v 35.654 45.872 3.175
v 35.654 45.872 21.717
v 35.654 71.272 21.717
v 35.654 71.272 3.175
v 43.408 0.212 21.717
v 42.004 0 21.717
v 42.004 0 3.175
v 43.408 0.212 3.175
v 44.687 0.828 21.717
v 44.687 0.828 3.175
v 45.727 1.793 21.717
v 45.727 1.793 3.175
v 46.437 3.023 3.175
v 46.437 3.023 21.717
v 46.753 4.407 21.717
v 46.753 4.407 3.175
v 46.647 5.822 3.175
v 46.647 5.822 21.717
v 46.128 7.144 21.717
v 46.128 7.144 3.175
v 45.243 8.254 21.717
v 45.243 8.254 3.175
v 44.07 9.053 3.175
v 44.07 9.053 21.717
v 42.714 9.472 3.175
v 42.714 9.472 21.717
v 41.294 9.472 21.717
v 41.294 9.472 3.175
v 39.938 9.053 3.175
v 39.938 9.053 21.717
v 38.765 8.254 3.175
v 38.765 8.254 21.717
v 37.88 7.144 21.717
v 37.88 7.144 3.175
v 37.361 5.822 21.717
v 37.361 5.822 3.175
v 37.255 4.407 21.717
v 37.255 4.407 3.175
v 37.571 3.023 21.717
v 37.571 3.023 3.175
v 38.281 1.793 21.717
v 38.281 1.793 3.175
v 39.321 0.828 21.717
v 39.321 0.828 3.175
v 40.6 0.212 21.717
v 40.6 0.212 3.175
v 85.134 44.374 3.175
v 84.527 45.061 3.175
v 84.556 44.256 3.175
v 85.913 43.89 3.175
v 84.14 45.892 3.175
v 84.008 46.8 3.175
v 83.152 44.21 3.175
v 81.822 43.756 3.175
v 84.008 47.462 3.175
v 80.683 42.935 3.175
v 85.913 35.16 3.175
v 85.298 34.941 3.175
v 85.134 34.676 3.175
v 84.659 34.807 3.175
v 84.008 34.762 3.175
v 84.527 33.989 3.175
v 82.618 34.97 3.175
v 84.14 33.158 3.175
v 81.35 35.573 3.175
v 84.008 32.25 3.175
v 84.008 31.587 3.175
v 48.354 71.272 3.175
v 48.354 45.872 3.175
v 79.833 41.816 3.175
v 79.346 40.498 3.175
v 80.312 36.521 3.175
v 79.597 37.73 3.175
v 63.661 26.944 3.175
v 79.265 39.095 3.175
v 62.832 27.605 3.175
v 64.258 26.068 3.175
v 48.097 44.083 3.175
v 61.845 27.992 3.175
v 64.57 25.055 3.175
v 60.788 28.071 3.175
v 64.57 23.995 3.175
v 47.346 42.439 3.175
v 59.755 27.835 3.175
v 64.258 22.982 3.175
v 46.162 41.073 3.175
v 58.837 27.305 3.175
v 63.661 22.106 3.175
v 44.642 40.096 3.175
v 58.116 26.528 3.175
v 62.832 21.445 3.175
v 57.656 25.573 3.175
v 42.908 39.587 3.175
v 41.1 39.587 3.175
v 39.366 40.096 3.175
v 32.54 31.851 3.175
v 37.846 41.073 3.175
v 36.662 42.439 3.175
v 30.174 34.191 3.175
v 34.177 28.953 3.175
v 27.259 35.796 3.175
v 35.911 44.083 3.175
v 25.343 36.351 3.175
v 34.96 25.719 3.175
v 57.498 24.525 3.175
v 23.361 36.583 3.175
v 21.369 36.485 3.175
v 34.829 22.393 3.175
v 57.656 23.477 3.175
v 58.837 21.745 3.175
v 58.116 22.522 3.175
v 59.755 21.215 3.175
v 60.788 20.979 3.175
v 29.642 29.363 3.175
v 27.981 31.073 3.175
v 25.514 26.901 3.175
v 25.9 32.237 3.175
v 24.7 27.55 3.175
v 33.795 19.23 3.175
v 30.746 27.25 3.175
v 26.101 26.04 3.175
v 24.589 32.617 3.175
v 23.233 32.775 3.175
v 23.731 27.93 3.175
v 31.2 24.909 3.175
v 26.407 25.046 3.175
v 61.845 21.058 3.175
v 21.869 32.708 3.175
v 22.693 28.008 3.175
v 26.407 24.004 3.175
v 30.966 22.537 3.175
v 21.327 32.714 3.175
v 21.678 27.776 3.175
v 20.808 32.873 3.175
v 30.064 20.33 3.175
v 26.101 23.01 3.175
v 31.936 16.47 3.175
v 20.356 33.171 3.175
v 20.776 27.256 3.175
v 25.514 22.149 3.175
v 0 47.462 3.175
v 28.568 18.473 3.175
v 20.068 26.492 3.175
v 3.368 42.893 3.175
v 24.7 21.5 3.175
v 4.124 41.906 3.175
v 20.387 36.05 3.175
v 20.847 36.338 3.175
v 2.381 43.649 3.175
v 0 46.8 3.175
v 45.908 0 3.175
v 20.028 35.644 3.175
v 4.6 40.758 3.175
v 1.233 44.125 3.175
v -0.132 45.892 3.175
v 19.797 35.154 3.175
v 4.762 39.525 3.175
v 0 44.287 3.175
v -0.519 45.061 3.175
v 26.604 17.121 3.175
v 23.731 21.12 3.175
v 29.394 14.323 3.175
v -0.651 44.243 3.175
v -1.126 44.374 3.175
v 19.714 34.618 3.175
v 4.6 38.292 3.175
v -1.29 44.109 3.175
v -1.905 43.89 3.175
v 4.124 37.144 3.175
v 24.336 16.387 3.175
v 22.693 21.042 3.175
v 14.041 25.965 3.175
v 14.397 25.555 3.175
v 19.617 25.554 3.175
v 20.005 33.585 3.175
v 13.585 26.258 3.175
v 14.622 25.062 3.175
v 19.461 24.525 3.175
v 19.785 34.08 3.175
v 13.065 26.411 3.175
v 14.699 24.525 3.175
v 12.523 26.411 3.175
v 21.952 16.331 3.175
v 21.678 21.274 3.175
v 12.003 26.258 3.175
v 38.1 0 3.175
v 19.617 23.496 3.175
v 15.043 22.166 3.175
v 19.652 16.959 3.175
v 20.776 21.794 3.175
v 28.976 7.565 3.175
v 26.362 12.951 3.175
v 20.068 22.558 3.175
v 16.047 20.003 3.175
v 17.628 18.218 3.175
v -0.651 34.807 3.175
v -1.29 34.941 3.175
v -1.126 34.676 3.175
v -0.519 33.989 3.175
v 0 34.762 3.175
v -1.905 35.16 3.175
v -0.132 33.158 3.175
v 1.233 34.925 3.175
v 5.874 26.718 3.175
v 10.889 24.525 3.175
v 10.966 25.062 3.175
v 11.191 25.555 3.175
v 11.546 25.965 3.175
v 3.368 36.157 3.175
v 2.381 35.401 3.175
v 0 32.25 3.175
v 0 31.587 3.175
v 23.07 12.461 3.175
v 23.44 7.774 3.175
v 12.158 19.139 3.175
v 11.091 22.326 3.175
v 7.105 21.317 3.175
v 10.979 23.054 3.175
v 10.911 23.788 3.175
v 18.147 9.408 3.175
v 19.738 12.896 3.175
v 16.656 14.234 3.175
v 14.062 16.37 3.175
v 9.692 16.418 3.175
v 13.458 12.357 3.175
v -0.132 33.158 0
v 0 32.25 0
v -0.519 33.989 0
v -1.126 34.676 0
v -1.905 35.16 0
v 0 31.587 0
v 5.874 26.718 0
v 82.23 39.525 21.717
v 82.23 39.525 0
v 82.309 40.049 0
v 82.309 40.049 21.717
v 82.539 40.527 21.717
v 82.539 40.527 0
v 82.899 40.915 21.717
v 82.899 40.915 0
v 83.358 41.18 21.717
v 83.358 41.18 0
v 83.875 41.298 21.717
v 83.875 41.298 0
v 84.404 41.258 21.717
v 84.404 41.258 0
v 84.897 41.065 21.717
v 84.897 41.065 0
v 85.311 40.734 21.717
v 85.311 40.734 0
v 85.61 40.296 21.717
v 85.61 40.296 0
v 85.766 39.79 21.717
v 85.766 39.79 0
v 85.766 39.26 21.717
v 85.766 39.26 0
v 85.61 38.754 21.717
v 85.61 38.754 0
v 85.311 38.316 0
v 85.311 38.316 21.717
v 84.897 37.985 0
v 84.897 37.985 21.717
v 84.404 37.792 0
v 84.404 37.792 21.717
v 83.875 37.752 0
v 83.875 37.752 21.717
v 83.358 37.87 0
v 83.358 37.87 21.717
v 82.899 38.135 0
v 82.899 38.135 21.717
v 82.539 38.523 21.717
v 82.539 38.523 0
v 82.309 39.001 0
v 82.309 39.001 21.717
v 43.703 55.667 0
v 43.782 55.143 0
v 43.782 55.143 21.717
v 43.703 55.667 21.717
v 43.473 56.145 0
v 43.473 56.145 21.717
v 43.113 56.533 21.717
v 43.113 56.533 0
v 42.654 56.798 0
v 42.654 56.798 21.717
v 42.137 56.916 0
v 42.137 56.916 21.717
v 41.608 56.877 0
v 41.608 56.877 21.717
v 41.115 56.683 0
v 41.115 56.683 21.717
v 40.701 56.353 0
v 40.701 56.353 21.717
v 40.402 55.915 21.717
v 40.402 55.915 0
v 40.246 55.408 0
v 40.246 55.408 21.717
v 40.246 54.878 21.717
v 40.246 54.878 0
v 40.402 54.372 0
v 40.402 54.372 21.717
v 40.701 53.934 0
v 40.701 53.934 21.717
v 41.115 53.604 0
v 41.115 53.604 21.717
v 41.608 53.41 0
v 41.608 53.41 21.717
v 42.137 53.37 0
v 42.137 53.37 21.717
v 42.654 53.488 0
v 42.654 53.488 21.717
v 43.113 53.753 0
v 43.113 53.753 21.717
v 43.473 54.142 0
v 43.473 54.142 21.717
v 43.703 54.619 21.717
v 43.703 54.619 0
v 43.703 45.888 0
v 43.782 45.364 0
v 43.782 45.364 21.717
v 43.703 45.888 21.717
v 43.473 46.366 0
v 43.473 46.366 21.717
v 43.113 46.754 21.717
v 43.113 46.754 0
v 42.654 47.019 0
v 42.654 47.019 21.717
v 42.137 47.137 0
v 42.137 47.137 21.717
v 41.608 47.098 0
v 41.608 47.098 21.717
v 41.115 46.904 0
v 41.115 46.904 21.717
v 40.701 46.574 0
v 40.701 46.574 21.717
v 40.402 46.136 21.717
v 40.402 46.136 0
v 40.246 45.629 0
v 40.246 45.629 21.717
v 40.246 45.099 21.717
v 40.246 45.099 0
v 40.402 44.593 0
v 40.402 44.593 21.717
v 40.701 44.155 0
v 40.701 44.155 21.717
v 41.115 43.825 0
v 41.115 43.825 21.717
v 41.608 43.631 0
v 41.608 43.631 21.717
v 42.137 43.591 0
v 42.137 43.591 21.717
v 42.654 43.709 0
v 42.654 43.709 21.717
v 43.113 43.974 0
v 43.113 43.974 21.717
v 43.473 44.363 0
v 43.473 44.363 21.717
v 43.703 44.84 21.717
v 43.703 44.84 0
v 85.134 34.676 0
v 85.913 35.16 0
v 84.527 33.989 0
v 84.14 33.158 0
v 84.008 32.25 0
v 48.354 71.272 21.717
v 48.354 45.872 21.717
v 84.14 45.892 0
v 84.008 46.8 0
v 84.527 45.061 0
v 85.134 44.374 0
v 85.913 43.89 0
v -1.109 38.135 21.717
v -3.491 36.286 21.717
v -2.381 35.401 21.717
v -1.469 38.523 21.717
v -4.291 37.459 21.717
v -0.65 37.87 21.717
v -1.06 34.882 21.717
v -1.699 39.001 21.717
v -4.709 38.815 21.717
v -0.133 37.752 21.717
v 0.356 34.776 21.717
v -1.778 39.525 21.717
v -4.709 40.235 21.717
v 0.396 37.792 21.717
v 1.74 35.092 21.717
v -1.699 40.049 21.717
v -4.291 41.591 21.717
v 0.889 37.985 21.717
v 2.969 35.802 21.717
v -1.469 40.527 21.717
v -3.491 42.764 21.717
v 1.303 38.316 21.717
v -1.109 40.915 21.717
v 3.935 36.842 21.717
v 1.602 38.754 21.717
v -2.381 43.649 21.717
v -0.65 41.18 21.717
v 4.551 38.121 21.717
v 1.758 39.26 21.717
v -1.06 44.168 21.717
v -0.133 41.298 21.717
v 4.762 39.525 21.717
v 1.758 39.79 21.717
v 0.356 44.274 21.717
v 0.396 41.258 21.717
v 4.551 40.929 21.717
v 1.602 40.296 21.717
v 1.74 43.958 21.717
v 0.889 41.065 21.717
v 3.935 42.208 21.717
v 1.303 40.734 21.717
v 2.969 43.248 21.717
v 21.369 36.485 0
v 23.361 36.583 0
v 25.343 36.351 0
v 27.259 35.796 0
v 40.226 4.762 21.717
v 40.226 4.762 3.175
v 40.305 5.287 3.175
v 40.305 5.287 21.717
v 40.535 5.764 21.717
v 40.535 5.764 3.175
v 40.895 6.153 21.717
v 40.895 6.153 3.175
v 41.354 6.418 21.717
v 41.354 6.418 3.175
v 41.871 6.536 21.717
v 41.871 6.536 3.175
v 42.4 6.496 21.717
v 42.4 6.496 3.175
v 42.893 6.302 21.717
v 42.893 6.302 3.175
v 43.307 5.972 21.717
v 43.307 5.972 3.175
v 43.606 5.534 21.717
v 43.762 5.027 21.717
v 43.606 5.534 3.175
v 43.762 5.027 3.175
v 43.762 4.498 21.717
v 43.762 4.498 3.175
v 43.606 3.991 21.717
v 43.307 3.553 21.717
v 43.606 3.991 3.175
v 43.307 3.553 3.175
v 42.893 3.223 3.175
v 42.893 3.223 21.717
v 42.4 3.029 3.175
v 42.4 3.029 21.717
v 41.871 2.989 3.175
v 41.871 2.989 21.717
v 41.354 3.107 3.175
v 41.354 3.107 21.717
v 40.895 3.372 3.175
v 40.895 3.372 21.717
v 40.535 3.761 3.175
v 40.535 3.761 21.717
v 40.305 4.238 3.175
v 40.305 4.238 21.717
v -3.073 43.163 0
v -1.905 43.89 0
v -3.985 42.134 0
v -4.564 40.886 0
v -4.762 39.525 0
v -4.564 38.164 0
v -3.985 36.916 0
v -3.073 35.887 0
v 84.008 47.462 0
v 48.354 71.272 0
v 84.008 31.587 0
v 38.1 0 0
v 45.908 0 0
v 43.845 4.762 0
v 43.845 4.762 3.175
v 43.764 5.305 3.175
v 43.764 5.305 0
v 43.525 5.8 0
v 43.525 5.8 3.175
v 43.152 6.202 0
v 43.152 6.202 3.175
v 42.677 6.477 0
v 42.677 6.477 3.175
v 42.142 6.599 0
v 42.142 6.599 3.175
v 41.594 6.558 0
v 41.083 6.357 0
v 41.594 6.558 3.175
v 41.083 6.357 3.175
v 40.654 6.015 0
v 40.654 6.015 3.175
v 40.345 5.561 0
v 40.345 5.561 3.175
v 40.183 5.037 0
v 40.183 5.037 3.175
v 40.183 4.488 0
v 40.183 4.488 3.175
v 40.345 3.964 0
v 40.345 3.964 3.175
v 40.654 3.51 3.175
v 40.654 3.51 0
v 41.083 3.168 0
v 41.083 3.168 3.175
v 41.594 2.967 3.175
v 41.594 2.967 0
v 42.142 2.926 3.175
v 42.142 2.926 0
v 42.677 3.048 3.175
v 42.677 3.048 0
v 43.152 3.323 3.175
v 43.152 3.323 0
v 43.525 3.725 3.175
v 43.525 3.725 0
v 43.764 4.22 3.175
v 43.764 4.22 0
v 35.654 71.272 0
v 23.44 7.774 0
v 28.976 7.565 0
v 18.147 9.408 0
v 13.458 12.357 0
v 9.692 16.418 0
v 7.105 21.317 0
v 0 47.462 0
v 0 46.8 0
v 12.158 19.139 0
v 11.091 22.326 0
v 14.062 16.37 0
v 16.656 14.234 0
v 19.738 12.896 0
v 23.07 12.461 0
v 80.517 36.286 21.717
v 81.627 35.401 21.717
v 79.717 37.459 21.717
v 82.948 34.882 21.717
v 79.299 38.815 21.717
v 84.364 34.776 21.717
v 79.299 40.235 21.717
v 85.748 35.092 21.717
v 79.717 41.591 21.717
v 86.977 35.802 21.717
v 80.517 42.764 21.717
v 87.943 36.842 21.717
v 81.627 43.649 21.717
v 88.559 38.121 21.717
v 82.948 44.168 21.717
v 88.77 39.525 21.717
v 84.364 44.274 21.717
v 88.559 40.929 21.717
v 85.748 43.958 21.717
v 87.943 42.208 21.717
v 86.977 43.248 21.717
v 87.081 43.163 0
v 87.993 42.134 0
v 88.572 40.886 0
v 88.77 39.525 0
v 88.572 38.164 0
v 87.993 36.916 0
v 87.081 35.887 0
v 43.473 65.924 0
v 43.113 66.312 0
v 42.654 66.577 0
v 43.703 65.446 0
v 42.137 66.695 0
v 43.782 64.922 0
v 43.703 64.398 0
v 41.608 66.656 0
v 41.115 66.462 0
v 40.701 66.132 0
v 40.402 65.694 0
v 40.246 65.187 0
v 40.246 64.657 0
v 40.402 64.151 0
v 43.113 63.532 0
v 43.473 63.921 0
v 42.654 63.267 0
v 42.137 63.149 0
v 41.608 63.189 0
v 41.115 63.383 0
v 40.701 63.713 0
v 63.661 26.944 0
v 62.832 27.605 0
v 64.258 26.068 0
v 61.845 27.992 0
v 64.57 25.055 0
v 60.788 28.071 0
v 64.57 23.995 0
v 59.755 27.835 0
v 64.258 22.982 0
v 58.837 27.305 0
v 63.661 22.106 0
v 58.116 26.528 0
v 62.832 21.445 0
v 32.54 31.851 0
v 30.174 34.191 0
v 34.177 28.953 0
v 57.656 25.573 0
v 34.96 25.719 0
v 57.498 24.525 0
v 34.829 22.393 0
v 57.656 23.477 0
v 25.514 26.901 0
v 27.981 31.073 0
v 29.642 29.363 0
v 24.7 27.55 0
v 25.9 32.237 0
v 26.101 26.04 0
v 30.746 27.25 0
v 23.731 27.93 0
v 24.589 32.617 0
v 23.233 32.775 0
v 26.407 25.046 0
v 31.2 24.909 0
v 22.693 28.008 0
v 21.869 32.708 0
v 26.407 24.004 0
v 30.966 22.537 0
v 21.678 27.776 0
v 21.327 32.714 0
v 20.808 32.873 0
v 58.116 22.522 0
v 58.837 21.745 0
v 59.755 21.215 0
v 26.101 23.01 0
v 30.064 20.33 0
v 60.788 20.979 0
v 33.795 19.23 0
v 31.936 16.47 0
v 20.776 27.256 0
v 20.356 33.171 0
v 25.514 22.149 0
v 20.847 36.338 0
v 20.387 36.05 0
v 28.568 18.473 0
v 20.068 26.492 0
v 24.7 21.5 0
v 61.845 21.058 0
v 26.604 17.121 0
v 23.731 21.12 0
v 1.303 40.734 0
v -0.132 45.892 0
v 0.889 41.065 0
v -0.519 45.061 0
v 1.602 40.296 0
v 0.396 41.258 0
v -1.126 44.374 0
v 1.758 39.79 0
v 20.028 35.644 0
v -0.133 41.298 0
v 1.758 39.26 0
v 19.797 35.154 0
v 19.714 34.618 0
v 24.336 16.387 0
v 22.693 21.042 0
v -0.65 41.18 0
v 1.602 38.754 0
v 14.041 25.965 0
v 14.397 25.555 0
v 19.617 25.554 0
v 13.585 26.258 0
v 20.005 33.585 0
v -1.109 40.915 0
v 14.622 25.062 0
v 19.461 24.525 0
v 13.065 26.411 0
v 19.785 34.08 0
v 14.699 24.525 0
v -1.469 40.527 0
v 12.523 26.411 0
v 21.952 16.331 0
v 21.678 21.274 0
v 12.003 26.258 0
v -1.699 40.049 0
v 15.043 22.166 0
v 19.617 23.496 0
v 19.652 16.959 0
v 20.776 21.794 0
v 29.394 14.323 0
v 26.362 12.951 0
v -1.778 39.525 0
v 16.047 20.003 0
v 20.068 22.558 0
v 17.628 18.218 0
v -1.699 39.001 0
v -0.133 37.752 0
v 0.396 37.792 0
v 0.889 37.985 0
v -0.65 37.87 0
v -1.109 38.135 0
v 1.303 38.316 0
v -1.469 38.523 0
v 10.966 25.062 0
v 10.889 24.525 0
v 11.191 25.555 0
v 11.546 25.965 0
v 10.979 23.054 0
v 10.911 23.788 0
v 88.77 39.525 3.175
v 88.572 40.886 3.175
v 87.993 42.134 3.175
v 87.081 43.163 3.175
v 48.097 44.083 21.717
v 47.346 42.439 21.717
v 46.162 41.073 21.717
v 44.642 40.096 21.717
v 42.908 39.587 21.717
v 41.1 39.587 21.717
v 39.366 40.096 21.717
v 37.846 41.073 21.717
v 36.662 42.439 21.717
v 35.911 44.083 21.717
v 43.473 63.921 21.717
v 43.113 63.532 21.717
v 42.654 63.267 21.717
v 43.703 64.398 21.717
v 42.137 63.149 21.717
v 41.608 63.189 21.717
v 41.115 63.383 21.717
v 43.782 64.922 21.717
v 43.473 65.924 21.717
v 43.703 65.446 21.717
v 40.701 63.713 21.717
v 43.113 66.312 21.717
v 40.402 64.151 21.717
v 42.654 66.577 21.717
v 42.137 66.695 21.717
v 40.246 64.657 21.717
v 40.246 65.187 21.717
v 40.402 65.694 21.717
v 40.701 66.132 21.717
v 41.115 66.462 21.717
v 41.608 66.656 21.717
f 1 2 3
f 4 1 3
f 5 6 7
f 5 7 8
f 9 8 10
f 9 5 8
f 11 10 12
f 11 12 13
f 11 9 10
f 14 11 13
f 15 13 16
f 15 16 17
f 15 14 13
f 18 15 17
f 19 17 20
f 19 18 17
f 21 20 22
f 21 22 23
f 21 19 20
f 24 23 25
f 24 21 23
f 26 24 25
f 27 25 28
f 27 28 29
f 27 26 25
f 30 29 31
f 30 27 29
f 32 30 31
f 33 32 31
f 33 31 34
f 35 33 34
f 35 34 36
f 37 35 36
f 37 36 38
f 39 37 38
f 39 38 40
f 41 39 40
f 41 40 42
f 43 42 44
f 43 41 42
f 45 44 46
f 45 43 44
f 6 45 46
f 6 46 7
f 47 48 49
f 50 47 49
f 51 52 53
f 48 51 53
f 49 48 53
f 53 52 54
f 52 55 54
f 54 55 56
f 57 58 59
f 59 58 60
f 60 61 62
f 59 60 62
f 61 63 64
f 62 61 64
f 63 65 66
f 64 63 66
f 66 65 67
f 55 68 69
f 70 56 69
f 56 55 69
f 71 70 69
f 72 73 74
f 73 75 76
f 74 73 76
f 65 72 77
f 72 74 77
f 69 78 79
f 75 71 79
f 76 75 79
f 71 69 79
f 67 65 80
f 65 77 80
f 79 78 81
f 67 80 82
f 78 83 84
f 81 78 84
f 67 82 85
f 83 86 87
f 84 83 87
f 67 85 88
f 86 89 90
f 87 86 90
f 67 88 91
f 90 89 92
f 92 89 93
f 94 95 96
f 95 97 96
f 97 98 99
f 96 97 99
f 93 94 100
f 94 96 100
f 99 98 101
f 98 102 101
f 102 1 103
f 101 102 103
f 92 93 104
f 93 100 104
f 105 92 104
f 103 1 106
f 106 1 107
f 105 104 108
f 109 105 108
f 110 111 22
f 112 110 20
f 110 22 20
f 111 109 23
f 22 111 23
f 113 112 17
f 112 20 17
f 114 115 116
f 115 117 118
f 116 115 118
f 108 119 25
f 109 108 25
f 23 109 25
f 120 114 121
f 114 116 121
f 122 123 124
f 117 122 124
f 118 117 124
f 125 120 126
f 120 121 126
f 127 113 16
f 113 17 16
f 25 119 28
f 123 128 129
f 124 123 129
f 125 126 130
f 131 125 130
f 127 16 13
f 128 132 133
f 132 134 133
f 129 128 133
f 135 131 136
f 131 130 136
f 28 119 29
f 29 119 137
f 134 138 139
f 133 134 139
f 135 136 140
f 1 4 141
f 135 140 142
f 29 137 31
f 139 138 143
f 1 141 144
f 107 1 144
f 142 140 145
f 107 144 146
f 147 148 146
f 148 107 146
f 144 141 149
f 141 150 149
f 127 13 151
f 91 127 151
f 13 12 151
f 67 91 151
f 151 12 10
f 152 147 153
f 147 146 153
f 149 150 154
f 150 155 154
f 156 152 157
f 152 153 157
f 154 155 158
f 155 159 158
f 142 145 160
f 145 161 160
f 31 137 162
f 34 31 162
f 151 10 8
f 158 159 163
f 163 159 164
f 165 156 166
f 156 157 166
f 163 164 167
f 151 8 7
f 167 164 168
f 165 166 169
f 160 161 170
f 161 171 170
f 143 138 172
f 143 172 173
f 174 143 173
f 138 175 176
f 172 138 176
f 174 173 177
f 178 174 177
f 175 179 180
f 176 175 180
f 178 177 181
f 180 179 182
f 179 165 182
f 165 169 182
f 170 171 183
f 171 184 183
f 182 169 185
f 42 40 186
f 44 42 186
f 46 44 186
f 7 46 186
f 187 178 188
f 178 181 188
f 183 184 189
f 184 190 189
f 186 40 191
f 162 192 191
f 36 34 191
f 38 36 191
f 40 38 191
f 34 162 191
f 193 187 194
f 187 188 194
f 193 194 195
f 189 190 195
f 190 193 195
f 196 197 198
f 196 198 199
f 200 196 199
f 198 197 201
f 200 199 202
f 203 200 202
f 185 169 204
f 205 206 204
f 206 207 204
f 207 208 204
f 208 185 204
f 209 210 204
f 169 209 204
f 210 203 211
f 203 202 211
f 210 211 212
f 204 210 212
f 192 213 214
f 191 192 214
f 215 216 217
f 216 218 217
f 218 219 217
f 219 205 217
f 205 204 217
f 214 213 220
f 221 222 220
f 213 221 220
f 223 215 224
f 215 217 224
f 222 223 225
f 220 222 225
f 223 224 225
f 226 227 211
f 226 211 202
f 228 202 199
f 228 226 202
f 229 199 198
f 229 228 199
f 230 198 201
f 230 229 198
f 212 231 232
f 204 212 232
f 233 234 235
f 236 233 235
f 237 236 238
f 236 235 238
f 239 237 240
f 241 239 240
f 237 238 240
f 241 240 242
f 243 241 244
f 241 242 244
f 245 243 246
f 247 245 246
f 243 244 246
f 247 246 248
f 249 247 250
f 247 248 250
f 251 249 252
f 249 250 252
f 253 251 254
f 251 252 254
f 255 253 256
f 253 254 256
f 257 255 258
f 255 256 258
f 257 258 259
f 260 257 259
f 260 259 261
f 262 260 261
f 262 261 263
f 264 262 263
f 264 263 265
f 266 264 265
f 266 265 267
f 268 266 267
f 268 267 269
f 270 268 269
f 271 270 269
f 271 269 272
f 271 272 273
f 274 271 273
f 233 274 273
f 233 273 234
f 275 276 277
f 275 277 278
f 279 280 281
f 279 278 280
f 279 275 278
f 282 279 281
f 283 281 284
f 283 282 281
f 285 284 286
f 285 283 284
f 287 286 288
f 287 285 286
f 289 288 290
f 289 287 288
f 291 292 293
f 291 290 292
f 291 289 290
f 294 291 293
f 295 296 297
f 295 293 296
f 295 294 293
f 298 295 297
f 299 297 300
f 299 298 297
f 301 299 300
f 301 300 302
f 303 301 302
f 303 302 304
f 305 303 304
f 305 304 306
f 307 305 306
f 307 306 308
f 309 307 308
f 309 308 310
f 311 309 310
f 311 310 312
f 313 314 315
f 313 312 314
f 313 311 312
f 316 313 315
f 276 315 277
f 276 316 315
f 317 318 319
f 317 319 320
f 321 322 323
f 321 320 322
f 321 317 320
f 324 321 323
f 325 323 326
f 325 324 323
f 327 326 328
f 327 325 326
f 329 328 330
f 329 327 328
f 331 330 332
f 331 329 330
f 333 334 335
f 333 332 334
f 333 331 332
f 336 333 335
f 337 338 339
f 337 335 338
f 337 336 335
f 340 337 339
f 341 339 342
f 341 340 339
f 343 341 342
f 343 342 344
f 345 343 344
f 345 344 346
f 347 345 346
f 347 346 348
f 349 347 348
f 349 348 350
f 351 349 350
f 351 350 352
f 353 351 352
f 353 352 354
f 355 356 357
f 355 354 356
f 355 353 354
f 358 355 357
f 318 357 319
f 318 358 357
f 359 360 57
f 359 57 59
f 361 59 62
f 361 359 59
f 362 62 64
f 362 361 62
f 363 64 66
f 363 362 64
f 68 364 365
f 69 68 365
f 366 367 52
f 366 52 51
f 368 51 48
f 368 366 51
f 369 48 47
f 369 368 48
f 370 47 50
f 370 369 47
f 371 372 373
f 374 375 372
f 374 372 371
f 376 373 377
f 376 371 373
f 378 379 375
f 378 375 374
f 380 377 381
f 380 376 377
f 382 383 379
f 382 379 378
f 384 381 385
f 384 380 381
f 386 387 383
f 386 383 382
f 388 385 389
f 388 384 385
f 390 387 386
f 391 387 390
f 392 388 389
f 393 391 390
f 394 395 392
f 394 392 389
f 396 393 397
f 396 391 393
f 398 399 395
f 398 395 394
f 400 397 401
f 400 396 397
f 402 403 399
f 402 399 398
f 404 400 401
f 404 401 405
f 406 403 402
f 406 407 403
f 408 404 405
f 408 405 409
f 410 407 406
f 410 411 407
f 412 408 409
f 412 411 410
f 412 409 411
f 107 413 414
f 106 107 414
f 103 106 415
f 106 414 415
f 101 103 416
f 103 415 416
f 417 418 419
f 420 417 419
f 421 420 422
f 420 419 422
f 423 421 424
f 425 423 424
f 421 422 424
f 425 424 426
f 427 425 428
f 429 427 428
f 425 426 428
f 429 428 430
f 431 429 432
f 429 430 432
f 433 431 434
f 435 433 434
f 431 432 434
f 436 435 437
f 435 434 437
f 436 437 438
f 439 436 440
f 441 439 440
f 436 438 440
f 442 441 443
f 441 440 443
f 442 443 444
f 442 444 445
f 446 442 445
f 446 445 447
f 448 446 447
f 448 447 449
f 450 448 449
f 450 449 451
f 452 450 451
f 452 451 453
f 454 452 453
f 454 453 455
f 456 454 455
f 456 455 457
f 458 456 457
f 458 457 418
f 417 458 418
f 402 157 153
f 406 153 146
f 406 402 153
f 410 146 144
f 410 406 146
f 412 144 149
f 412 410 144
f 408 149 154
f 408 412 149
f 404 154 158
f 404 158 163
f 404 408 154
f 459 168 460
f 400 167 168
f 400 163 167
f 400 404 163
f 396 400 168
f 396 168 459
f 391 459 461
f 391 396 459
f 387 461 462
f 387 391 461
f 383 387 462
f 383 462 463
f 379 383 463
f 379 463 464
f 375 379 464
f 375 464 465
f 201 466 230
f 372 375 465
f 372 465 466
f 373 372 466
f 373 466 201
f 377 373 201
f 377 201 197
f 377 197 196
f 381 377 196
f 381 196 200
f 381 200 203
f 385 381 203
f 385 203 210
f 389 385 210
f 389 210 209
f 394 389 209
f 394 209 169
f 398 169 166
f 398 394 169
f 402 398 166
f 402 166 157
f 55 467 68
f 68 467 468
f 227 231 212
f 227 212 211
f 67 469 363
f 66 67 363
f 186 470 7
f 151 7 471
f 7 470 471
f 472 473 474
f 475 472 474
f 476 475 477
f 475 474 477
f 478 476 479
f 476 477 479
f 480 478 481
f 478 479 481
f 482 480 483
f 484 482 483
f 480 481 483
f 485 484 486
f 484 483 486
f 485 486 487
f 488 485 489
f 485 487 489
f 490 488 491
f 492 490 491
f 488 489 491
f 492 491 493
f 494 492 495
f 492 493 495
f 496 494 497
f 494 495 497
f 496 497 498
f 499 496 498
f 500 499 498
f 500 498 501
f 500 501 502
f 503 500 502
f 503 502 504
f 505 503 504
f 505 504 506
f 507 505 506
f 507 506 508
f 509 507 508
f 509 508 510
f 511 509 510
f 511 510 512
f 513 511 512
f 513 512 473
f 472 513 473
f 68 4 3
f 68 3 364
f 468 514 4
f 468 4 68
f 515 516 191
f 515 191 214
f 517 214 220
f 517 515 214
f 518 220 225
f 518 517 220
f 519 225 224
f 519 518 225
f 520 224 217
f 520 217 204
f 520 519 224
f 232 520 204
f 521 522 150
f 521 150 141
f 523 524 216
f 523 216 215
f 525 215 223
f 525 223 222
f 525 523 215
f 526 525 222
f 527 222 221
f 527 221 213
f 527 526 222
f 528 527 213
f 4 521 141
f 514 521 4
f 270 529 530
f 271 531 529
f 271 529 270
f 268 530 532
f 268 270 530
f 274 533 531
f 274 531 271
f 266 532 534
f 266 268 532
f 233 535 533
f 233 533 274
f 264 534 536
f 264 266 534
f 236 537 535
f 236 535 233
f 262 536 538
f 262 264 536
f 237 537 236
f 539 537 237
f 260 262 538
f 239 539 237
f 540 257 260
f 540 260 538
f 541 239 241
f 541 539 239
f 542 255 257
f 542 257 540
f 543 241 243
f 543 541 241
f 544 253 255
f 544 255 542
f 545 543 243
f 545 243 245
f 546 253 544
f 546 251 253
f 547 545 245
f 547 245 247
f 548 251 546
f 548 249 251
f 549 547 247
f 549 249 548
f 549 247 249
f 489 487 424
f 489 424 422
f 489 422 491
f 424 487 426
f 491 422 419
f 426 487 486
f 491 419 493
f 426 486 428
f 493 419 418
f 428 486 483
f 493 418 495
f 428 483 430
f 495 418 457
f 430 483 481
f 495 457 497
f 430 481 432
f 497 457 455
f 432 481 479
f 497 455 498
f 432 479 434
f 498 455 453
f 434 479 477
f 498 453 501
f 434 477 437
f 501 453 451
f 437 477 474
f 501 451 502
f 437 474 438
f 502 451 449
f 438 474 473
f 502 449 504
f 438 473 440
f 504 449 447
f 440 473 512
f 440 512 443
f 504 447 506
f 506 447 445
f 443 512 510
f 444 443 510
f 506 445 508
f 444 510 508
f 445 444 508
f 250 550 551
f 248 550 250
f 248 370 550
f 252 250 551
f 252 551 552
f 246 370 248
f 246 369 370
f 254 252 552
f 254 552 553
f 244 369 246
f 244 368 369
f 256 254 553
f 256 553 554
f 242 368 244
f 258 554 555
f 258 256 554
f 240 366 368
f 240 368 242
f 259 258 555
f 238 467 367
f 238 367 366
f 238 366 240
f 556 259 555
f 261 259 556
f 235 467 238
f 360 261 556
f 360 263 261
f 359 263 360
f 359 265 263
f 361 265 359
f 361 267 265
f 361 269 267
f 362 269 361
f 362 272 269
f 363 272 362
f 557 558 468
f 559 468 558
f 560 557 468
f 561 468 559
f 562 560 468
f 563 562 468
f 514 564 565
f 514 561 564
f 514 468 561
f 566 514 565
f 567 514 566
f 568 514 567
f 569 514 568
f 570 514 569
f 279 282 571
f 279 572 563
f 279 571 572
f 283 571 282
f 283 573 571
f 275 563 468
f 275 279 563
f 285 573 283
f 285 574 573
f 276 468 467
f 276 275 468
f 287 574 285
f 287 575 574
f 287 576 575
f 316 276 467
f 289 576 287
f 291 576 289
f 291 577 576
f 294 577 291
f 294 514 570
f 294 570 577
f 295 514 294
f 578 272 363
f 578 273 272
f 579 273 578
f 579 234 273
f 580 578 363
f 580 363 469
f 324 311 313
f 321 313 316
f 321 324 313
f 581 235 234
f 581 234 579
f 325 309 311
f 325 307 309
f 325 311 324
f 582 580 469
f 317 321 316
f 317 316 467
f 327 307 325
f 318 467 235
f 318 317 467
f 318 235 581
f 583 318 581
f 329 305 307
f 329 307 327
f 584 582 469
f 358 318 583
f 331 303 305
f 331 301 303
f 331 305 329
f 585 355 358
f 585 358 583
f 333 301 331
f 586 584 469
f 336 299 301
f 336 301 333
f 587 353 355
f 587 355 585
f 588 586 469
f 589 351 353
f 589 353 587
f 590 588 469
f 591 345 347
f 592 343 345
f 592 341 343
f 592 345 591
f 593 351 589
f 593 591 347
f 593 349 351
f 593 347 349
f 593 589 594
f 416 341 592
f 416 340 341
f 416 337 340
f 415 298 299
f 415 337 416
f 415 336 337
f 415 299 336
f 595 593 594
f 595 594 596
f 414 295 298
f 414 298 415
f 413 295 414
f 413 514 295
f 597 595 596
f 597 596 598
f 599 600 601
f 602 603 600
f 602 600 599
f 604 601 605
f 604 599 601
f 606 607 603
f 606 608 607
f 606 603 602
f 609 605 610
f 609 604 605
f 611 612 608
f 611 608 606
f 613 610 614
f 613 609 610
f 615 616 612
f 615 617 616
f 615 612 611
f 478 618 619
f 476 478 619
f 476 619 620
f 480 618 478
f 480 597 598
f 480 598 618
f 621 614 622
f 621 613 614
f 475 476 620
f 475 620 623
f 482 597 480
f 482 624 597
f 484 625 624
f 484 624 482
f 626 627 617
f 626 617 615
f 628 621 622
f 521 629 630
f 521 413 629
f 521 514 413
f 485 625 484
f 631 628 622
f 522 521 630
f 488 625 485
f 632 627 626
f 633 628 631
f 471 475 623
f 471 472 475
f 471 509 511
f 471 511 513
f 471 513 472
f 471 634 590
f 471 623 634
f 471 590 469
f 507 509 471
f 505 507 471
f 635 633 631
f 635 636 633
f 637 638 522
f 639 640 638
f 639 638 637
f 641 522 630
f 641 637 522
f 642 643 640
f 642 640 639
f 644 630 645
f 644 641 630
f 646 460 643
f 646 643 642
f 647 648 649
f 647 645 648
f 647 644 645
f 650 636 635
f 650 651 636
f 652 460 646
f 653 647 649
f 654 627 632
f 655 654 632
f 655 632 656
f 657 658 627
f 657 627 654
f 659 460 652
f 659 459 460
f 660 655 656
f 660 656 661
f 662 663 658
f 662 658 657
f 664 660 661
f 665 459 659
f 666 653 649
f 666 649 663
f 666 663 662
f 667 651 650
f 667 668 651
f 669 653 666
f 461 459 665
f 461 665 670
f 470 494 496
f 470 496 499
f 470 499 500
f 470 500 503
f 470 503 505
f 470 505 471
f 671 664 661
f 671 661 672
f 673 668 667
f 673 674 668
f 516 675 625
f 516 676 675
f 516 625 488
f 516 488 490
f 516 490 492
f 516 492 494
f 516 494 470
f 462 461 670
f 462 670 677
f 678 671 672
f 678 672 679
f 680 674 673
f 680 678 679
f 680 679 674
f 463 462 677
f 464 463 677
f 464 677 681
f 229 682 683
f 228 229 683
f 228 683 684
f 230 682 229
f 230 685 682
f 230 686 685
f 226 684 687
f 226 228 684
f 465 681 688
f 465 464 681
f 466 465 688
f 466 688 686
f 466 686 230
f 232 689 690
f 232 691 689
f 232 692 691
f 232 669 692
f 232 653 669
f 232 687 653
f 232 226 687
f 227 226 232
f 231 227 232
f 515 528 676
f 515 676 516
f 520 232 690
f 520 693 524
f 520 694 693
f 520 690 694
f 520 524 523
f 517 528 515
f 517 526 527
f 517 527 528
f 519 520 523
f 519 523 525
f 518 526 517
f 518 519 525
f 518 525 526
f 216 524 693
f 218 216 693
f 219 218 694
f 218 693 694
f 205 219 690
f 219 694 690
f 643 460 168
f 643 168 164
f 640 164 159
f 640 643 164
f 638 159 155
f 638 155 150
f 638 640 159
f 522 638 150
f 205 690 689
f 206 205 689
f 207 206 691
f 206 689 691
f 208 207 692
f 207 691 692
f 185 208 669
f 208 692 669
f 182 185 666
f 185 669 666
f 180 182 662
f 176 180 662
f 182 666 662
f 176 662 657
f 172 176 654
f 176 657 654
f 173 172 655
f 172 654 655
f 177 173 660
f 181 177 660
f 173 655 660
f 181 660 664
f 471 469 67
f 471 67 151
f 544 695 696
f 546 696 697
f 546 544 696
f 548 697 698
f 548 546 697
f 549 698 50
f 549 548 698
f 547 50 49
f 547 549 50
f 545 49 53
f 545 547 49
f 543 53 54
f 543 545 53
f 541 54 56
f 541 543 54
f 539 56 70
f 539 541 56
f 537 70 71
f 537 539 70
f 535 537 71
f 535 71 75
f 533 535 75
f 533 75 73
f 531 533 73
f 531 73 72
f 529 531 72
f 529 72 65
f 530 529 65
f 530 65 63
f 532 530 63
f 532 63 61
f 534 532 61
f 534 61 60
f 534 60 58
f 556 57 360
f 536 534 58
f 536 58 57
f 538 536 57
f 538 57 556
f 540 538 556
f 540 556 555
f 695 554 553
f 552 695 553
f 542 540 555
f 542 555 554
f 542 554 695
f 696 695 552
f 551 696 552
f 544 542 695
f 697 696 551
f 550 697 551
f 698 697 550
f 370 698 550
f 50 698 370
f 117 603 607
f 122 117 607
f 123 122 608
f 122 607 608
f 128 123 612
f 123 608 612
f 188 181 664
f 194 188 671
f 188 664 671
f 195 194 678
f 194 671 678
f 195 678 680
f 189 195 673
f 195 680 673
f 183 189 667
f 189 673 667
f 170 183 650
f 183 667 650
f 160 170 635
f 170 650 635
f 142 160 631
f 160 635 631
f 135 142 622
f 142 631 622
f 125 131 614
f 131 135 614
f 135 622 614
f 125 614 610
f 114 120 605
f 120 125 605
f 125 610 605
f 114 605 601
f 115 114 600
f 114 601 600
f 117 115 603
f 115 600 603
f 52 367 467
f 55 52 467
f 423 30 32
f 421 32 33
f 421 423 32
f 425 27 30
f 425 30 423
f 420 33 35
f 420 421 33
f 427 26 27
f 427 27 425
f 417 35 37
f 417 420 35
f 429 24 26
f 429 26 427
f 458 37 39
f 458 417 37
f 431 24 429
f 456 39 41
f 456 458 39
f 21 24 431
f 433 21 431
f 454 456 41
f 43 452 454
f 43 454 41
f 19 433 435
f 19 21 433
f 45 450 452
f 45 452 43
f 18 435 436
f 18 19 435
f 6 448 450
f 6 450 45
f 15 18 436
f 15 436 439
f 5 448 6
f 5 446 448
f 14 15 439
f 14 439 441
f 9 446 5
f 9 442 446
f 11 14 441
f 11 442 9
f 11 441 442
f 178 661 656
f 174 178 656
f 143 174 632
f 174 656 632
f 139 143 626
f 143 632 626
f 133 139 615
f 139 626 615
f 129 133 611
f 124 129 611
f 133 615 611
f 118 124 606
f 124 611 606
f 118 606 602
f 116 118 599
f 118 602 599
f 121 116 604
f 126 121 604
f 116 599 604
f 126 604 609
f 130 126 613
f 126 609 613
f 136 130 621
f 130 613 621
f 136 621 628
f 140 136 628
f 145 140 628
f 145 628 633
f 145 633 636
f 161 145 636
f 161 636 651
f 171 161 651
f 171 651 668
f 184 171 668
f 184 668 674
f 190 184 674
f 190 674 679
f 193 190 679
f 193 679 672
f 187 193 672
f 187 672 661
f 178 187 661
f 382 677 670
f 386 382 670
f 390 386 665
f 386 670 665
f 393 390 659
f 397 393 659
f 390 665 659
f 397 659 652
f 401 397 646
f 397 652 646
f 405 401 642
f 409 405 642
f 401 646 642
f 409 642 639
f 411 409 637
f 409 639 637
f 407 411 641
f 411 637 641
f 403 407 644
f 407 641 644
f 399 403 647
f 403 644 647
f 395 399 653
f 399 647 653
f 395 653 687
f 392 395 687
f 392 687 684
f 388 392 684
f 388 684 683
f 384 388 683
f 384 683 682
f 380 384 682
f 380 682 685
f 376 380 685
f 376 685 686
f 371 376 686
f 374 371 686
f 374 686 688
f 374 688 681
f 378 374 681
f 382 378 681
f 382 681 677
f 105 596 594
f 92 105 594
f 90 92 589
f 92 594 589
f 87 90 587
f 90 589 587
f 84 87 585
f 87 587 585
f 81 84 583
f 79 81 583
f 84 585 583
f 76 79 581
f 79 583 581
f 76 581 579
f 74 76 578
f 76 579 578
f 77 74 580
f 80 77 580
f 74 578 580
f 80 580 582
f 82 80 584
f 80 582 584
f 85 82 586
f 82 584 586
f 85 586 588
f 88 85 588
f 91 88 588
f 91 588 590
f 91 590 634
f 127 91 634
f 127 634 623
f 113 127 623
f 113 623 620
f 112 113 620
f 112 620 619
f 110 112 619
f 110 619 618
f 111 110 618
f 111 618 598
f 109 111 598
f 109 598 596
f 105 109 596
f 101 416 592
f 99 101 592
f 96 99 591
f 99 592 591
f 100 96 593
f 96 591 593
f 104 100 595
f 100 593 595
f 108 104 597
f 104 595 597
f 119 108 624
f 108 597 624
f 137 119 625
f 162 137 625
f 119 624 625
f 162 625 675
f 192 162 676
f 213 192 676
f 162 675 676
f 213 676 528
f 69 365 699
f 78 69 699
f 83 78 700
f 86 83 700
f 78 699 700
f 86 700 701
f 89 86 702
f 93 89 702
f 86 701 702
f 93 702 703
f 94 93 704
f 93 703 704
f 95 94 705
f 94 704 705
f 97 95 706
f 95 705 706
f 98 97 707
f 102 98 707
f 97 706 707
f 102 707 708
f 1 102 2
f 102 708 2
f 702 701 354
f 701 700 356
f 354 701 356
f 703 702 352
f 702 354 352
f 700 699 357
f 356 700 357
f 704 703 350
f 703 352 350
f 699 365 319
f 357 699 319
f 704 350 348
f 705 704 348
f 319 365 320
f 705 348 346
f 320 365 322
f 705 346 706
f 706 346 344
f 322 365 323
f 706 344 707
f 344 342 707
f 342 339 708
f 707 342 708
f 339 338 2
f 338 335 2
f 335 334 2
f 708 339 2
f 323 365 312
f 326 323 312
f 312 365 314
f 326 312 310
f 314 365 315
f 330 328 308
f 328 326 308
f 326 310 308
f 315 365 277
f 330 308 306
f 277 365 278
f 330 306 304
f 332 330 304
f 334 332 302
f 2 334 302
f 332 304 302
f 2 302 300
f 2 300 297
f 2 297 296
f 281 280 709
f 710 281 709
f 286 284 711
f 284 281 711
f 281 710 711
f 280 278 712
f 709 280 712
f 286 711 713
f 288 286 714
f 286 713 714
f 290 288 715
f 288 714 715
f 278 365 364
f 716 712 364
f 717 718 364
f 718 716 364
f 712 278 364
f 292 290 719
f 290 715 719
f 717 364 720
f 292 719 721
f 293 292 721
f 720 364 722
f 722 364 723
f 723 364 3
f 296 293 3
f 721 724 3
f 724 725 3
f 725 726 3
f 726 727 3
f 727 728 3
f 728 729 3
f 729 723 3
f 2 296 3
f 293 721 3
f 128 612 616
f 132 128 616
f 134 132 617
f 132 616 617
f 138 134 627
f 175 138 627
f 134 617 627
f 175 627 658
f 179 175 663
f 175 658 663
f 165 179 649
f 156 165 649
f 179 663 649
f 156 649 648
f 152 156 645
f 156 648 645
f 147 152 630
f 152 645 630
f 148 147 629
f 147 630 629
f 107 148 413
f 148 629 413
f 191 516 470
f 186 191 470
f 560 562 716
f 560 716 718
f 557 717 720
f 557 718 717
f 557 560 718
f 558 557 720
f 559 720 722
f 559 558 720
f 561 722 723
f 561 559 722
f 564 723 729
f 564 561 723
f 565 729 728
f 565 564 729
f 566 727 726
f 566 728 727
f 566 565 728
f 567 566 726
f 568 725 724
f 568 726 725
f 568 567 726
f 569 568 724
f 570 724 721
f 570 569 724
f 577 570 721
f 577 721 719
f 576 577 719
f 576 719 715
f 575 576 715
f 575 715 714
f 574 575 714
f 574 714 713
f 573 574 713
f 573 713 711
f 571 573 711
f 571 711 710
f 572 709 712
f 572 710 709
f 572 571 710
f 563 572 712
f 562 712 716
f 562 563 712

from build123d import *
from build123d.topology import SkipClean

# Parameters (mm, degrees)
SKETCH1_W               = 84.00796
SKETCH1_H               = 71.2724
BOSS_EXTRUDE1_DEPTH     = 3.175
SKETCH5_R               = 4.7625
BOSS_EXTRUDE3_DEPTH     = 3.175
SKETCH3_R               = 1.8415
CUT_EXTRUDE1_DEPTH      = 114.886040389
BOSS_EXTRUDE4_START     = 18.542
SKETCH6_R               = 4.7625
BOSS_EXTRUDE4_DEPTH     = 18.542
CUT_EXTRUDE2_DEPTH      = 116.341906237
CUT_EXTRUDE2_DEPTH_BACK = 116.341906237
SKETCH4_R               = 1.778
SKETCH7_R               = 1.778
CUT_EXTRUDE3_DEPTH      = 116.894683482
SKETCH8_R               = 3.556
SKETCH8_R_2             = 3.4925
CUT_EXTRUDE4_DEPTH      = 116.894683482
CUT_EXTRUDE5_DEPTH      = 116.894683482
FILLET1_R               = 3.175
BOSS_EXTRUDE5_DEPTH     = 3.175
CUT_EXTRUDE7_DEPTH      = 5.08


with BuildPart() as part:
    # Sketch1 → Boss-Extrude1 (new body)
    with BuildSketch(Plane.XY):
        with Locations((42.00398, 35.6362)):
            Rectangle(SKETCH1_W, SKETCH1_H)
    extrude(amount=BOSS_EXTRUDE1_DEPTH)

    # Sketch5 → Boss-Extrude3 (add)
    with BuildSketch(Plane.XY.offset(3.175)):
        with Locations((84.00796, 39.524999944)):
            Circle(SKETCH5_R)
        with Locations((0, 39.524999944)):
            Circle(SKETCH5_R)
    extrude(amount=-BOSS_EXTRUDE3_DEPTH)

    # Sketch3 → Cut-Extrude1 (cut, through all)
    with BuildSketch(Plane.XY.offset(3.175)):
        with Locations((42.00398, 4.7625)):
            Circle(SKETCH3_R)
    extrude(amount=-CUT_EXTRUDE1_DEPTH, mode=Mode.SUBTRACT)

    # Sketch6 → Boss-Extrude4 (add)
    with BuildSketch(Plane.XY.offset(3.175).offset(BOSS_EXTRUDE4_START)):
        with Locations((84.00796, 39.524999944)):
            Circle(SKETCH6_R)
        with Locations((0, 39.524999944)):
            Circle(SKETCH6_R)
        with Locations(Location((42.00398, 4.7625, 0), (0, 0, 270))):
            Circle(SKETCH6_R)
        with BuildLine():
            Line((35.65398, 71.2724), (48.35398, 71.2724))
            Line((48.35398, 71.2724), (48.35398, 45.8724))
            ThreePointArc((48.35398, 45.8724), (42.00398, 39.5224), (35.65398, 45.8724))
            Line((35.65398, 45.8724), (35.65398, 71.2724))
        make_face()
    extrude(amount=-BOSS_EXTRUDE4_DEPTH)

    # Sketch4 → Cut-Extrude2 (cut, two sides: drawn at the far end of the back side and taken through both)
    with BuildSketch(Plane.XY.offset(3.175).offset(-CUT_EXTRUDE2_DEPTH_BACK)):
        with Locations((42.00398, 64.9224)):
            Circle(SKETCH4_R)
        with Locations((42.00398, 55.1434)):
            Circle(SKETCH4_R)
        with Locations((42.00398, 45.3644)):
            Circle(SKETCH4_R)
    extrude(amount=CUT_EXTRUDE2_DEPTH + CUT_EXTRUDE2_DEPTH_BACK, mode=Mode.SUBTRACT)

    # Sketch7 → Cut-Extrude3 (cut, through all)
    with BuildSketch(Plane(origin=(0, 0, 0), x_dir=(-1, 0, 0), z_dir=(0, 0, -1))):
        with Locations((-42.00398, 4.7625)):
            Circle(SKETCH7_R)
        with Locations((0, 39.524999944)):
            Circle(SKETCH7_R)
        with Locations((-84.00796, 39.524999944)):
            Circle(SKETCH7_R)
    extrude(amount=-CUT_EXTRUDE3_DEPTH, mode=Mode.SUBTRACT)

    # Sketch8 → Cut-Extrude4 (cut, through all)
    with BuildSketch(Plane(origin=(0, 0, 0), x_dir=(-1, 0, 0), z_dir=(0, 0, -1))):
        with Locations((-61.05398, 24.524999972)):
            Circle(SKETCH8_R)
        with Locations((-22.95398, 24.524999972)):
            Circle(SKETCH8_R_2)
    extrude(amount=-CUT_EXTRUDE4_DEPTH, mode=Mode.SUBTRACT)

    # Sketch9 → Cut-Extrude5 (cut, through all)
    with BuildSketch(Plane(origin=(0, 0, 0), x_dir=(-1, 0, 0), z_dir=(0, 0, -1))):
        Polygon((-84.00796, 0), (-84.00796, 31.587499944), (-45.90796, 0), align=None)
        Polygon((-84.00796, 71.2724), (-84.00796, 47.462499944), (-48.35398, 71.2724), align=None)
    cut_extrude5 = extrude(amount=-CUT_EXTRUDE5_DEPTH, mode=Mode.SUBTRACT)

    # Mirror1: Cut-Extrude5 across plane
    add(cut_extrude5.mirror(Plane(origin=(42.00398, 0, 0), x_dir=(0, 0, 1), z_dir=(1, 0, 0))), mode=Mode.SUBTRACT)

    # Fillet1
    # the kernel refuses this fillet: 3.175 mm, written as the material it adds along each edge
    with BuildSketch(Plane(origin=(84.00796, 34.762499944, 0), x_dir=(0.9789063129307042, 0.2043096436892158, 0), z_dir=(0, 0, 1))) as fillet1_piece_1:
        with BuildLine():
            CenterArc((2.594732475, -3.108027544), FILLET1_R, 101.789089239, 66.421821522)
            Line((-0.513295069, -2.459344425), (0, 0))
            ThreePointArc((0, 0), (0.973024678, -0.100458685), (1.946049356, 0))
        make_face()
    extrude(amount=3.175)
    with BuildSketch(Plane(origin=(84.00796, 44.287499944, 0), x_dir=(0, 1, 0), z_dir=(0, 0, 1)), Plane(origin=(0, 34.762499944, 0), x_dir=(0, -1, 0), z_dir=(0, 0, 1))) as fillet1_piece_2:
        with BuildLine():
            CenterArc((2.512338916, -3.175), FILLET1_R, 90, 66.421821522)
            ThreePointArc((-0.397596651, -1.905), (-0.100458685, -0.973024678), (0, 0))
            Line((0, 0), (2.512338916, 0))
        make_face()
    extrude(amount=3.175)
    with BuildSketch(Plane(origin=(0, 44.287499944, 0), x_dir=(0, 1, 0), z_dir=(0, 0, 1))) as fillet1_piece_3:
        with BuildLine():
            CenterArc((2.512338916, 3.175), FILLET1_R, 203.578178478, 66.421821522)
            ThreePointArc((-0.397596651, 1.905), (-0.100458685, 0.973024678), (0, 0))
            Line((0, 0), (2.512338916, 0))
        make_face()
    extrude(amount=3.175)

    # Sketch10 → Boss-Extrude5 (add)
    with BuildSketch(Plane(origin=(0, 0, 0), x_dir=(-1, 0, 0), z_dir=(0, 0, -1))):
        with BuildLine():
            Line((-23.070402794, 12.460561704), (-28.975644685, 7.564713202))
            ThreePointArc((-28.975644685, 7.564713202), (-13.458086548, 12.356642178), (-5.873921435, 26.717618238))
            Line((-5.873921435, 26.717618238), (-11.078476776, 22.402686701))
            ThreePointArc((-11.078476776, 22.402686701), (-11.084404387, 22.364145909), (-11.091119617, 22.325734519))
            ThreePointArc((-11.091119617, 22.325734519), (-15.284227222, 15.211616198), (-23.070402794, 12.460561704))
        make_face()
    extrude(amount=-BOSS_EXTRUDE5_DEPTH)

    # Sketch11 → Cut-Extrude7 (cut)
    with SkipClean():  # the faces are left unmerged after this step: merging them gives an invalid solid
        with BuildSketch(Plane(origin=(0, 0, 0), x_dir=(-1, 0, 0), z_dir=(0, 0, -1))):
            with BuildLine():
                ThreePointArc((-25.8996445, 32.236555305), (-24.799823539, 34.695913728), (-27.259181962, 35.795734689))
                ThreePointArc((-27.259181962, 35.795734689), (-34.829175406, 22.39334356), (-23.070402794, 12.460561704))
                Line((-23.070402794, 12.460561704), (-11.078476776, 22.402686701))
                ThreePointArc((-11.078476776, 22.402686701), (-11.084404387, 22.364145909), (-11.091119617, 22.325734519))
                ThreePointArc((-11.091119617, 22.325734519), (-10.939621184, 23.420732233), (-10.88898, 24.524999972))
                ThreePointArc((-10.88898, 24.524999972), (-12.79398, 26.429999972), (-14.69898, 24.524999972))
                ThreePointArc((-14.69898, 24.524999972), (-27.635249302, 17.725680688), (-25.8996445, 32.236555305))
            make_face()
            with BuildLine():
                ThreePointArc((-21.368554277, 36.485378322), (-24.356904724, 36.508155951), (-27.259181962, 35.795734689))
                ThreePointArc((-27.259181962, 35.795734689), (-24.799823539, 34.695913728), (-25.8996445, 32.236555305))
                ThreePointArc((-25.8996445, 32.236555305), (-23.913875864, 32.724001431), (-21.869215031, 32.708416738))
                ThreePointArc((-21.869215031, 32.708416738), (-19.730403862, 34.346567153), (-21.368554277, 36.485378322))
            make_face()
        extrude(amount=-CUT_EXTRUDE7_DEPTH, mode=Mode.SUBTRACT)


solid = part.part
